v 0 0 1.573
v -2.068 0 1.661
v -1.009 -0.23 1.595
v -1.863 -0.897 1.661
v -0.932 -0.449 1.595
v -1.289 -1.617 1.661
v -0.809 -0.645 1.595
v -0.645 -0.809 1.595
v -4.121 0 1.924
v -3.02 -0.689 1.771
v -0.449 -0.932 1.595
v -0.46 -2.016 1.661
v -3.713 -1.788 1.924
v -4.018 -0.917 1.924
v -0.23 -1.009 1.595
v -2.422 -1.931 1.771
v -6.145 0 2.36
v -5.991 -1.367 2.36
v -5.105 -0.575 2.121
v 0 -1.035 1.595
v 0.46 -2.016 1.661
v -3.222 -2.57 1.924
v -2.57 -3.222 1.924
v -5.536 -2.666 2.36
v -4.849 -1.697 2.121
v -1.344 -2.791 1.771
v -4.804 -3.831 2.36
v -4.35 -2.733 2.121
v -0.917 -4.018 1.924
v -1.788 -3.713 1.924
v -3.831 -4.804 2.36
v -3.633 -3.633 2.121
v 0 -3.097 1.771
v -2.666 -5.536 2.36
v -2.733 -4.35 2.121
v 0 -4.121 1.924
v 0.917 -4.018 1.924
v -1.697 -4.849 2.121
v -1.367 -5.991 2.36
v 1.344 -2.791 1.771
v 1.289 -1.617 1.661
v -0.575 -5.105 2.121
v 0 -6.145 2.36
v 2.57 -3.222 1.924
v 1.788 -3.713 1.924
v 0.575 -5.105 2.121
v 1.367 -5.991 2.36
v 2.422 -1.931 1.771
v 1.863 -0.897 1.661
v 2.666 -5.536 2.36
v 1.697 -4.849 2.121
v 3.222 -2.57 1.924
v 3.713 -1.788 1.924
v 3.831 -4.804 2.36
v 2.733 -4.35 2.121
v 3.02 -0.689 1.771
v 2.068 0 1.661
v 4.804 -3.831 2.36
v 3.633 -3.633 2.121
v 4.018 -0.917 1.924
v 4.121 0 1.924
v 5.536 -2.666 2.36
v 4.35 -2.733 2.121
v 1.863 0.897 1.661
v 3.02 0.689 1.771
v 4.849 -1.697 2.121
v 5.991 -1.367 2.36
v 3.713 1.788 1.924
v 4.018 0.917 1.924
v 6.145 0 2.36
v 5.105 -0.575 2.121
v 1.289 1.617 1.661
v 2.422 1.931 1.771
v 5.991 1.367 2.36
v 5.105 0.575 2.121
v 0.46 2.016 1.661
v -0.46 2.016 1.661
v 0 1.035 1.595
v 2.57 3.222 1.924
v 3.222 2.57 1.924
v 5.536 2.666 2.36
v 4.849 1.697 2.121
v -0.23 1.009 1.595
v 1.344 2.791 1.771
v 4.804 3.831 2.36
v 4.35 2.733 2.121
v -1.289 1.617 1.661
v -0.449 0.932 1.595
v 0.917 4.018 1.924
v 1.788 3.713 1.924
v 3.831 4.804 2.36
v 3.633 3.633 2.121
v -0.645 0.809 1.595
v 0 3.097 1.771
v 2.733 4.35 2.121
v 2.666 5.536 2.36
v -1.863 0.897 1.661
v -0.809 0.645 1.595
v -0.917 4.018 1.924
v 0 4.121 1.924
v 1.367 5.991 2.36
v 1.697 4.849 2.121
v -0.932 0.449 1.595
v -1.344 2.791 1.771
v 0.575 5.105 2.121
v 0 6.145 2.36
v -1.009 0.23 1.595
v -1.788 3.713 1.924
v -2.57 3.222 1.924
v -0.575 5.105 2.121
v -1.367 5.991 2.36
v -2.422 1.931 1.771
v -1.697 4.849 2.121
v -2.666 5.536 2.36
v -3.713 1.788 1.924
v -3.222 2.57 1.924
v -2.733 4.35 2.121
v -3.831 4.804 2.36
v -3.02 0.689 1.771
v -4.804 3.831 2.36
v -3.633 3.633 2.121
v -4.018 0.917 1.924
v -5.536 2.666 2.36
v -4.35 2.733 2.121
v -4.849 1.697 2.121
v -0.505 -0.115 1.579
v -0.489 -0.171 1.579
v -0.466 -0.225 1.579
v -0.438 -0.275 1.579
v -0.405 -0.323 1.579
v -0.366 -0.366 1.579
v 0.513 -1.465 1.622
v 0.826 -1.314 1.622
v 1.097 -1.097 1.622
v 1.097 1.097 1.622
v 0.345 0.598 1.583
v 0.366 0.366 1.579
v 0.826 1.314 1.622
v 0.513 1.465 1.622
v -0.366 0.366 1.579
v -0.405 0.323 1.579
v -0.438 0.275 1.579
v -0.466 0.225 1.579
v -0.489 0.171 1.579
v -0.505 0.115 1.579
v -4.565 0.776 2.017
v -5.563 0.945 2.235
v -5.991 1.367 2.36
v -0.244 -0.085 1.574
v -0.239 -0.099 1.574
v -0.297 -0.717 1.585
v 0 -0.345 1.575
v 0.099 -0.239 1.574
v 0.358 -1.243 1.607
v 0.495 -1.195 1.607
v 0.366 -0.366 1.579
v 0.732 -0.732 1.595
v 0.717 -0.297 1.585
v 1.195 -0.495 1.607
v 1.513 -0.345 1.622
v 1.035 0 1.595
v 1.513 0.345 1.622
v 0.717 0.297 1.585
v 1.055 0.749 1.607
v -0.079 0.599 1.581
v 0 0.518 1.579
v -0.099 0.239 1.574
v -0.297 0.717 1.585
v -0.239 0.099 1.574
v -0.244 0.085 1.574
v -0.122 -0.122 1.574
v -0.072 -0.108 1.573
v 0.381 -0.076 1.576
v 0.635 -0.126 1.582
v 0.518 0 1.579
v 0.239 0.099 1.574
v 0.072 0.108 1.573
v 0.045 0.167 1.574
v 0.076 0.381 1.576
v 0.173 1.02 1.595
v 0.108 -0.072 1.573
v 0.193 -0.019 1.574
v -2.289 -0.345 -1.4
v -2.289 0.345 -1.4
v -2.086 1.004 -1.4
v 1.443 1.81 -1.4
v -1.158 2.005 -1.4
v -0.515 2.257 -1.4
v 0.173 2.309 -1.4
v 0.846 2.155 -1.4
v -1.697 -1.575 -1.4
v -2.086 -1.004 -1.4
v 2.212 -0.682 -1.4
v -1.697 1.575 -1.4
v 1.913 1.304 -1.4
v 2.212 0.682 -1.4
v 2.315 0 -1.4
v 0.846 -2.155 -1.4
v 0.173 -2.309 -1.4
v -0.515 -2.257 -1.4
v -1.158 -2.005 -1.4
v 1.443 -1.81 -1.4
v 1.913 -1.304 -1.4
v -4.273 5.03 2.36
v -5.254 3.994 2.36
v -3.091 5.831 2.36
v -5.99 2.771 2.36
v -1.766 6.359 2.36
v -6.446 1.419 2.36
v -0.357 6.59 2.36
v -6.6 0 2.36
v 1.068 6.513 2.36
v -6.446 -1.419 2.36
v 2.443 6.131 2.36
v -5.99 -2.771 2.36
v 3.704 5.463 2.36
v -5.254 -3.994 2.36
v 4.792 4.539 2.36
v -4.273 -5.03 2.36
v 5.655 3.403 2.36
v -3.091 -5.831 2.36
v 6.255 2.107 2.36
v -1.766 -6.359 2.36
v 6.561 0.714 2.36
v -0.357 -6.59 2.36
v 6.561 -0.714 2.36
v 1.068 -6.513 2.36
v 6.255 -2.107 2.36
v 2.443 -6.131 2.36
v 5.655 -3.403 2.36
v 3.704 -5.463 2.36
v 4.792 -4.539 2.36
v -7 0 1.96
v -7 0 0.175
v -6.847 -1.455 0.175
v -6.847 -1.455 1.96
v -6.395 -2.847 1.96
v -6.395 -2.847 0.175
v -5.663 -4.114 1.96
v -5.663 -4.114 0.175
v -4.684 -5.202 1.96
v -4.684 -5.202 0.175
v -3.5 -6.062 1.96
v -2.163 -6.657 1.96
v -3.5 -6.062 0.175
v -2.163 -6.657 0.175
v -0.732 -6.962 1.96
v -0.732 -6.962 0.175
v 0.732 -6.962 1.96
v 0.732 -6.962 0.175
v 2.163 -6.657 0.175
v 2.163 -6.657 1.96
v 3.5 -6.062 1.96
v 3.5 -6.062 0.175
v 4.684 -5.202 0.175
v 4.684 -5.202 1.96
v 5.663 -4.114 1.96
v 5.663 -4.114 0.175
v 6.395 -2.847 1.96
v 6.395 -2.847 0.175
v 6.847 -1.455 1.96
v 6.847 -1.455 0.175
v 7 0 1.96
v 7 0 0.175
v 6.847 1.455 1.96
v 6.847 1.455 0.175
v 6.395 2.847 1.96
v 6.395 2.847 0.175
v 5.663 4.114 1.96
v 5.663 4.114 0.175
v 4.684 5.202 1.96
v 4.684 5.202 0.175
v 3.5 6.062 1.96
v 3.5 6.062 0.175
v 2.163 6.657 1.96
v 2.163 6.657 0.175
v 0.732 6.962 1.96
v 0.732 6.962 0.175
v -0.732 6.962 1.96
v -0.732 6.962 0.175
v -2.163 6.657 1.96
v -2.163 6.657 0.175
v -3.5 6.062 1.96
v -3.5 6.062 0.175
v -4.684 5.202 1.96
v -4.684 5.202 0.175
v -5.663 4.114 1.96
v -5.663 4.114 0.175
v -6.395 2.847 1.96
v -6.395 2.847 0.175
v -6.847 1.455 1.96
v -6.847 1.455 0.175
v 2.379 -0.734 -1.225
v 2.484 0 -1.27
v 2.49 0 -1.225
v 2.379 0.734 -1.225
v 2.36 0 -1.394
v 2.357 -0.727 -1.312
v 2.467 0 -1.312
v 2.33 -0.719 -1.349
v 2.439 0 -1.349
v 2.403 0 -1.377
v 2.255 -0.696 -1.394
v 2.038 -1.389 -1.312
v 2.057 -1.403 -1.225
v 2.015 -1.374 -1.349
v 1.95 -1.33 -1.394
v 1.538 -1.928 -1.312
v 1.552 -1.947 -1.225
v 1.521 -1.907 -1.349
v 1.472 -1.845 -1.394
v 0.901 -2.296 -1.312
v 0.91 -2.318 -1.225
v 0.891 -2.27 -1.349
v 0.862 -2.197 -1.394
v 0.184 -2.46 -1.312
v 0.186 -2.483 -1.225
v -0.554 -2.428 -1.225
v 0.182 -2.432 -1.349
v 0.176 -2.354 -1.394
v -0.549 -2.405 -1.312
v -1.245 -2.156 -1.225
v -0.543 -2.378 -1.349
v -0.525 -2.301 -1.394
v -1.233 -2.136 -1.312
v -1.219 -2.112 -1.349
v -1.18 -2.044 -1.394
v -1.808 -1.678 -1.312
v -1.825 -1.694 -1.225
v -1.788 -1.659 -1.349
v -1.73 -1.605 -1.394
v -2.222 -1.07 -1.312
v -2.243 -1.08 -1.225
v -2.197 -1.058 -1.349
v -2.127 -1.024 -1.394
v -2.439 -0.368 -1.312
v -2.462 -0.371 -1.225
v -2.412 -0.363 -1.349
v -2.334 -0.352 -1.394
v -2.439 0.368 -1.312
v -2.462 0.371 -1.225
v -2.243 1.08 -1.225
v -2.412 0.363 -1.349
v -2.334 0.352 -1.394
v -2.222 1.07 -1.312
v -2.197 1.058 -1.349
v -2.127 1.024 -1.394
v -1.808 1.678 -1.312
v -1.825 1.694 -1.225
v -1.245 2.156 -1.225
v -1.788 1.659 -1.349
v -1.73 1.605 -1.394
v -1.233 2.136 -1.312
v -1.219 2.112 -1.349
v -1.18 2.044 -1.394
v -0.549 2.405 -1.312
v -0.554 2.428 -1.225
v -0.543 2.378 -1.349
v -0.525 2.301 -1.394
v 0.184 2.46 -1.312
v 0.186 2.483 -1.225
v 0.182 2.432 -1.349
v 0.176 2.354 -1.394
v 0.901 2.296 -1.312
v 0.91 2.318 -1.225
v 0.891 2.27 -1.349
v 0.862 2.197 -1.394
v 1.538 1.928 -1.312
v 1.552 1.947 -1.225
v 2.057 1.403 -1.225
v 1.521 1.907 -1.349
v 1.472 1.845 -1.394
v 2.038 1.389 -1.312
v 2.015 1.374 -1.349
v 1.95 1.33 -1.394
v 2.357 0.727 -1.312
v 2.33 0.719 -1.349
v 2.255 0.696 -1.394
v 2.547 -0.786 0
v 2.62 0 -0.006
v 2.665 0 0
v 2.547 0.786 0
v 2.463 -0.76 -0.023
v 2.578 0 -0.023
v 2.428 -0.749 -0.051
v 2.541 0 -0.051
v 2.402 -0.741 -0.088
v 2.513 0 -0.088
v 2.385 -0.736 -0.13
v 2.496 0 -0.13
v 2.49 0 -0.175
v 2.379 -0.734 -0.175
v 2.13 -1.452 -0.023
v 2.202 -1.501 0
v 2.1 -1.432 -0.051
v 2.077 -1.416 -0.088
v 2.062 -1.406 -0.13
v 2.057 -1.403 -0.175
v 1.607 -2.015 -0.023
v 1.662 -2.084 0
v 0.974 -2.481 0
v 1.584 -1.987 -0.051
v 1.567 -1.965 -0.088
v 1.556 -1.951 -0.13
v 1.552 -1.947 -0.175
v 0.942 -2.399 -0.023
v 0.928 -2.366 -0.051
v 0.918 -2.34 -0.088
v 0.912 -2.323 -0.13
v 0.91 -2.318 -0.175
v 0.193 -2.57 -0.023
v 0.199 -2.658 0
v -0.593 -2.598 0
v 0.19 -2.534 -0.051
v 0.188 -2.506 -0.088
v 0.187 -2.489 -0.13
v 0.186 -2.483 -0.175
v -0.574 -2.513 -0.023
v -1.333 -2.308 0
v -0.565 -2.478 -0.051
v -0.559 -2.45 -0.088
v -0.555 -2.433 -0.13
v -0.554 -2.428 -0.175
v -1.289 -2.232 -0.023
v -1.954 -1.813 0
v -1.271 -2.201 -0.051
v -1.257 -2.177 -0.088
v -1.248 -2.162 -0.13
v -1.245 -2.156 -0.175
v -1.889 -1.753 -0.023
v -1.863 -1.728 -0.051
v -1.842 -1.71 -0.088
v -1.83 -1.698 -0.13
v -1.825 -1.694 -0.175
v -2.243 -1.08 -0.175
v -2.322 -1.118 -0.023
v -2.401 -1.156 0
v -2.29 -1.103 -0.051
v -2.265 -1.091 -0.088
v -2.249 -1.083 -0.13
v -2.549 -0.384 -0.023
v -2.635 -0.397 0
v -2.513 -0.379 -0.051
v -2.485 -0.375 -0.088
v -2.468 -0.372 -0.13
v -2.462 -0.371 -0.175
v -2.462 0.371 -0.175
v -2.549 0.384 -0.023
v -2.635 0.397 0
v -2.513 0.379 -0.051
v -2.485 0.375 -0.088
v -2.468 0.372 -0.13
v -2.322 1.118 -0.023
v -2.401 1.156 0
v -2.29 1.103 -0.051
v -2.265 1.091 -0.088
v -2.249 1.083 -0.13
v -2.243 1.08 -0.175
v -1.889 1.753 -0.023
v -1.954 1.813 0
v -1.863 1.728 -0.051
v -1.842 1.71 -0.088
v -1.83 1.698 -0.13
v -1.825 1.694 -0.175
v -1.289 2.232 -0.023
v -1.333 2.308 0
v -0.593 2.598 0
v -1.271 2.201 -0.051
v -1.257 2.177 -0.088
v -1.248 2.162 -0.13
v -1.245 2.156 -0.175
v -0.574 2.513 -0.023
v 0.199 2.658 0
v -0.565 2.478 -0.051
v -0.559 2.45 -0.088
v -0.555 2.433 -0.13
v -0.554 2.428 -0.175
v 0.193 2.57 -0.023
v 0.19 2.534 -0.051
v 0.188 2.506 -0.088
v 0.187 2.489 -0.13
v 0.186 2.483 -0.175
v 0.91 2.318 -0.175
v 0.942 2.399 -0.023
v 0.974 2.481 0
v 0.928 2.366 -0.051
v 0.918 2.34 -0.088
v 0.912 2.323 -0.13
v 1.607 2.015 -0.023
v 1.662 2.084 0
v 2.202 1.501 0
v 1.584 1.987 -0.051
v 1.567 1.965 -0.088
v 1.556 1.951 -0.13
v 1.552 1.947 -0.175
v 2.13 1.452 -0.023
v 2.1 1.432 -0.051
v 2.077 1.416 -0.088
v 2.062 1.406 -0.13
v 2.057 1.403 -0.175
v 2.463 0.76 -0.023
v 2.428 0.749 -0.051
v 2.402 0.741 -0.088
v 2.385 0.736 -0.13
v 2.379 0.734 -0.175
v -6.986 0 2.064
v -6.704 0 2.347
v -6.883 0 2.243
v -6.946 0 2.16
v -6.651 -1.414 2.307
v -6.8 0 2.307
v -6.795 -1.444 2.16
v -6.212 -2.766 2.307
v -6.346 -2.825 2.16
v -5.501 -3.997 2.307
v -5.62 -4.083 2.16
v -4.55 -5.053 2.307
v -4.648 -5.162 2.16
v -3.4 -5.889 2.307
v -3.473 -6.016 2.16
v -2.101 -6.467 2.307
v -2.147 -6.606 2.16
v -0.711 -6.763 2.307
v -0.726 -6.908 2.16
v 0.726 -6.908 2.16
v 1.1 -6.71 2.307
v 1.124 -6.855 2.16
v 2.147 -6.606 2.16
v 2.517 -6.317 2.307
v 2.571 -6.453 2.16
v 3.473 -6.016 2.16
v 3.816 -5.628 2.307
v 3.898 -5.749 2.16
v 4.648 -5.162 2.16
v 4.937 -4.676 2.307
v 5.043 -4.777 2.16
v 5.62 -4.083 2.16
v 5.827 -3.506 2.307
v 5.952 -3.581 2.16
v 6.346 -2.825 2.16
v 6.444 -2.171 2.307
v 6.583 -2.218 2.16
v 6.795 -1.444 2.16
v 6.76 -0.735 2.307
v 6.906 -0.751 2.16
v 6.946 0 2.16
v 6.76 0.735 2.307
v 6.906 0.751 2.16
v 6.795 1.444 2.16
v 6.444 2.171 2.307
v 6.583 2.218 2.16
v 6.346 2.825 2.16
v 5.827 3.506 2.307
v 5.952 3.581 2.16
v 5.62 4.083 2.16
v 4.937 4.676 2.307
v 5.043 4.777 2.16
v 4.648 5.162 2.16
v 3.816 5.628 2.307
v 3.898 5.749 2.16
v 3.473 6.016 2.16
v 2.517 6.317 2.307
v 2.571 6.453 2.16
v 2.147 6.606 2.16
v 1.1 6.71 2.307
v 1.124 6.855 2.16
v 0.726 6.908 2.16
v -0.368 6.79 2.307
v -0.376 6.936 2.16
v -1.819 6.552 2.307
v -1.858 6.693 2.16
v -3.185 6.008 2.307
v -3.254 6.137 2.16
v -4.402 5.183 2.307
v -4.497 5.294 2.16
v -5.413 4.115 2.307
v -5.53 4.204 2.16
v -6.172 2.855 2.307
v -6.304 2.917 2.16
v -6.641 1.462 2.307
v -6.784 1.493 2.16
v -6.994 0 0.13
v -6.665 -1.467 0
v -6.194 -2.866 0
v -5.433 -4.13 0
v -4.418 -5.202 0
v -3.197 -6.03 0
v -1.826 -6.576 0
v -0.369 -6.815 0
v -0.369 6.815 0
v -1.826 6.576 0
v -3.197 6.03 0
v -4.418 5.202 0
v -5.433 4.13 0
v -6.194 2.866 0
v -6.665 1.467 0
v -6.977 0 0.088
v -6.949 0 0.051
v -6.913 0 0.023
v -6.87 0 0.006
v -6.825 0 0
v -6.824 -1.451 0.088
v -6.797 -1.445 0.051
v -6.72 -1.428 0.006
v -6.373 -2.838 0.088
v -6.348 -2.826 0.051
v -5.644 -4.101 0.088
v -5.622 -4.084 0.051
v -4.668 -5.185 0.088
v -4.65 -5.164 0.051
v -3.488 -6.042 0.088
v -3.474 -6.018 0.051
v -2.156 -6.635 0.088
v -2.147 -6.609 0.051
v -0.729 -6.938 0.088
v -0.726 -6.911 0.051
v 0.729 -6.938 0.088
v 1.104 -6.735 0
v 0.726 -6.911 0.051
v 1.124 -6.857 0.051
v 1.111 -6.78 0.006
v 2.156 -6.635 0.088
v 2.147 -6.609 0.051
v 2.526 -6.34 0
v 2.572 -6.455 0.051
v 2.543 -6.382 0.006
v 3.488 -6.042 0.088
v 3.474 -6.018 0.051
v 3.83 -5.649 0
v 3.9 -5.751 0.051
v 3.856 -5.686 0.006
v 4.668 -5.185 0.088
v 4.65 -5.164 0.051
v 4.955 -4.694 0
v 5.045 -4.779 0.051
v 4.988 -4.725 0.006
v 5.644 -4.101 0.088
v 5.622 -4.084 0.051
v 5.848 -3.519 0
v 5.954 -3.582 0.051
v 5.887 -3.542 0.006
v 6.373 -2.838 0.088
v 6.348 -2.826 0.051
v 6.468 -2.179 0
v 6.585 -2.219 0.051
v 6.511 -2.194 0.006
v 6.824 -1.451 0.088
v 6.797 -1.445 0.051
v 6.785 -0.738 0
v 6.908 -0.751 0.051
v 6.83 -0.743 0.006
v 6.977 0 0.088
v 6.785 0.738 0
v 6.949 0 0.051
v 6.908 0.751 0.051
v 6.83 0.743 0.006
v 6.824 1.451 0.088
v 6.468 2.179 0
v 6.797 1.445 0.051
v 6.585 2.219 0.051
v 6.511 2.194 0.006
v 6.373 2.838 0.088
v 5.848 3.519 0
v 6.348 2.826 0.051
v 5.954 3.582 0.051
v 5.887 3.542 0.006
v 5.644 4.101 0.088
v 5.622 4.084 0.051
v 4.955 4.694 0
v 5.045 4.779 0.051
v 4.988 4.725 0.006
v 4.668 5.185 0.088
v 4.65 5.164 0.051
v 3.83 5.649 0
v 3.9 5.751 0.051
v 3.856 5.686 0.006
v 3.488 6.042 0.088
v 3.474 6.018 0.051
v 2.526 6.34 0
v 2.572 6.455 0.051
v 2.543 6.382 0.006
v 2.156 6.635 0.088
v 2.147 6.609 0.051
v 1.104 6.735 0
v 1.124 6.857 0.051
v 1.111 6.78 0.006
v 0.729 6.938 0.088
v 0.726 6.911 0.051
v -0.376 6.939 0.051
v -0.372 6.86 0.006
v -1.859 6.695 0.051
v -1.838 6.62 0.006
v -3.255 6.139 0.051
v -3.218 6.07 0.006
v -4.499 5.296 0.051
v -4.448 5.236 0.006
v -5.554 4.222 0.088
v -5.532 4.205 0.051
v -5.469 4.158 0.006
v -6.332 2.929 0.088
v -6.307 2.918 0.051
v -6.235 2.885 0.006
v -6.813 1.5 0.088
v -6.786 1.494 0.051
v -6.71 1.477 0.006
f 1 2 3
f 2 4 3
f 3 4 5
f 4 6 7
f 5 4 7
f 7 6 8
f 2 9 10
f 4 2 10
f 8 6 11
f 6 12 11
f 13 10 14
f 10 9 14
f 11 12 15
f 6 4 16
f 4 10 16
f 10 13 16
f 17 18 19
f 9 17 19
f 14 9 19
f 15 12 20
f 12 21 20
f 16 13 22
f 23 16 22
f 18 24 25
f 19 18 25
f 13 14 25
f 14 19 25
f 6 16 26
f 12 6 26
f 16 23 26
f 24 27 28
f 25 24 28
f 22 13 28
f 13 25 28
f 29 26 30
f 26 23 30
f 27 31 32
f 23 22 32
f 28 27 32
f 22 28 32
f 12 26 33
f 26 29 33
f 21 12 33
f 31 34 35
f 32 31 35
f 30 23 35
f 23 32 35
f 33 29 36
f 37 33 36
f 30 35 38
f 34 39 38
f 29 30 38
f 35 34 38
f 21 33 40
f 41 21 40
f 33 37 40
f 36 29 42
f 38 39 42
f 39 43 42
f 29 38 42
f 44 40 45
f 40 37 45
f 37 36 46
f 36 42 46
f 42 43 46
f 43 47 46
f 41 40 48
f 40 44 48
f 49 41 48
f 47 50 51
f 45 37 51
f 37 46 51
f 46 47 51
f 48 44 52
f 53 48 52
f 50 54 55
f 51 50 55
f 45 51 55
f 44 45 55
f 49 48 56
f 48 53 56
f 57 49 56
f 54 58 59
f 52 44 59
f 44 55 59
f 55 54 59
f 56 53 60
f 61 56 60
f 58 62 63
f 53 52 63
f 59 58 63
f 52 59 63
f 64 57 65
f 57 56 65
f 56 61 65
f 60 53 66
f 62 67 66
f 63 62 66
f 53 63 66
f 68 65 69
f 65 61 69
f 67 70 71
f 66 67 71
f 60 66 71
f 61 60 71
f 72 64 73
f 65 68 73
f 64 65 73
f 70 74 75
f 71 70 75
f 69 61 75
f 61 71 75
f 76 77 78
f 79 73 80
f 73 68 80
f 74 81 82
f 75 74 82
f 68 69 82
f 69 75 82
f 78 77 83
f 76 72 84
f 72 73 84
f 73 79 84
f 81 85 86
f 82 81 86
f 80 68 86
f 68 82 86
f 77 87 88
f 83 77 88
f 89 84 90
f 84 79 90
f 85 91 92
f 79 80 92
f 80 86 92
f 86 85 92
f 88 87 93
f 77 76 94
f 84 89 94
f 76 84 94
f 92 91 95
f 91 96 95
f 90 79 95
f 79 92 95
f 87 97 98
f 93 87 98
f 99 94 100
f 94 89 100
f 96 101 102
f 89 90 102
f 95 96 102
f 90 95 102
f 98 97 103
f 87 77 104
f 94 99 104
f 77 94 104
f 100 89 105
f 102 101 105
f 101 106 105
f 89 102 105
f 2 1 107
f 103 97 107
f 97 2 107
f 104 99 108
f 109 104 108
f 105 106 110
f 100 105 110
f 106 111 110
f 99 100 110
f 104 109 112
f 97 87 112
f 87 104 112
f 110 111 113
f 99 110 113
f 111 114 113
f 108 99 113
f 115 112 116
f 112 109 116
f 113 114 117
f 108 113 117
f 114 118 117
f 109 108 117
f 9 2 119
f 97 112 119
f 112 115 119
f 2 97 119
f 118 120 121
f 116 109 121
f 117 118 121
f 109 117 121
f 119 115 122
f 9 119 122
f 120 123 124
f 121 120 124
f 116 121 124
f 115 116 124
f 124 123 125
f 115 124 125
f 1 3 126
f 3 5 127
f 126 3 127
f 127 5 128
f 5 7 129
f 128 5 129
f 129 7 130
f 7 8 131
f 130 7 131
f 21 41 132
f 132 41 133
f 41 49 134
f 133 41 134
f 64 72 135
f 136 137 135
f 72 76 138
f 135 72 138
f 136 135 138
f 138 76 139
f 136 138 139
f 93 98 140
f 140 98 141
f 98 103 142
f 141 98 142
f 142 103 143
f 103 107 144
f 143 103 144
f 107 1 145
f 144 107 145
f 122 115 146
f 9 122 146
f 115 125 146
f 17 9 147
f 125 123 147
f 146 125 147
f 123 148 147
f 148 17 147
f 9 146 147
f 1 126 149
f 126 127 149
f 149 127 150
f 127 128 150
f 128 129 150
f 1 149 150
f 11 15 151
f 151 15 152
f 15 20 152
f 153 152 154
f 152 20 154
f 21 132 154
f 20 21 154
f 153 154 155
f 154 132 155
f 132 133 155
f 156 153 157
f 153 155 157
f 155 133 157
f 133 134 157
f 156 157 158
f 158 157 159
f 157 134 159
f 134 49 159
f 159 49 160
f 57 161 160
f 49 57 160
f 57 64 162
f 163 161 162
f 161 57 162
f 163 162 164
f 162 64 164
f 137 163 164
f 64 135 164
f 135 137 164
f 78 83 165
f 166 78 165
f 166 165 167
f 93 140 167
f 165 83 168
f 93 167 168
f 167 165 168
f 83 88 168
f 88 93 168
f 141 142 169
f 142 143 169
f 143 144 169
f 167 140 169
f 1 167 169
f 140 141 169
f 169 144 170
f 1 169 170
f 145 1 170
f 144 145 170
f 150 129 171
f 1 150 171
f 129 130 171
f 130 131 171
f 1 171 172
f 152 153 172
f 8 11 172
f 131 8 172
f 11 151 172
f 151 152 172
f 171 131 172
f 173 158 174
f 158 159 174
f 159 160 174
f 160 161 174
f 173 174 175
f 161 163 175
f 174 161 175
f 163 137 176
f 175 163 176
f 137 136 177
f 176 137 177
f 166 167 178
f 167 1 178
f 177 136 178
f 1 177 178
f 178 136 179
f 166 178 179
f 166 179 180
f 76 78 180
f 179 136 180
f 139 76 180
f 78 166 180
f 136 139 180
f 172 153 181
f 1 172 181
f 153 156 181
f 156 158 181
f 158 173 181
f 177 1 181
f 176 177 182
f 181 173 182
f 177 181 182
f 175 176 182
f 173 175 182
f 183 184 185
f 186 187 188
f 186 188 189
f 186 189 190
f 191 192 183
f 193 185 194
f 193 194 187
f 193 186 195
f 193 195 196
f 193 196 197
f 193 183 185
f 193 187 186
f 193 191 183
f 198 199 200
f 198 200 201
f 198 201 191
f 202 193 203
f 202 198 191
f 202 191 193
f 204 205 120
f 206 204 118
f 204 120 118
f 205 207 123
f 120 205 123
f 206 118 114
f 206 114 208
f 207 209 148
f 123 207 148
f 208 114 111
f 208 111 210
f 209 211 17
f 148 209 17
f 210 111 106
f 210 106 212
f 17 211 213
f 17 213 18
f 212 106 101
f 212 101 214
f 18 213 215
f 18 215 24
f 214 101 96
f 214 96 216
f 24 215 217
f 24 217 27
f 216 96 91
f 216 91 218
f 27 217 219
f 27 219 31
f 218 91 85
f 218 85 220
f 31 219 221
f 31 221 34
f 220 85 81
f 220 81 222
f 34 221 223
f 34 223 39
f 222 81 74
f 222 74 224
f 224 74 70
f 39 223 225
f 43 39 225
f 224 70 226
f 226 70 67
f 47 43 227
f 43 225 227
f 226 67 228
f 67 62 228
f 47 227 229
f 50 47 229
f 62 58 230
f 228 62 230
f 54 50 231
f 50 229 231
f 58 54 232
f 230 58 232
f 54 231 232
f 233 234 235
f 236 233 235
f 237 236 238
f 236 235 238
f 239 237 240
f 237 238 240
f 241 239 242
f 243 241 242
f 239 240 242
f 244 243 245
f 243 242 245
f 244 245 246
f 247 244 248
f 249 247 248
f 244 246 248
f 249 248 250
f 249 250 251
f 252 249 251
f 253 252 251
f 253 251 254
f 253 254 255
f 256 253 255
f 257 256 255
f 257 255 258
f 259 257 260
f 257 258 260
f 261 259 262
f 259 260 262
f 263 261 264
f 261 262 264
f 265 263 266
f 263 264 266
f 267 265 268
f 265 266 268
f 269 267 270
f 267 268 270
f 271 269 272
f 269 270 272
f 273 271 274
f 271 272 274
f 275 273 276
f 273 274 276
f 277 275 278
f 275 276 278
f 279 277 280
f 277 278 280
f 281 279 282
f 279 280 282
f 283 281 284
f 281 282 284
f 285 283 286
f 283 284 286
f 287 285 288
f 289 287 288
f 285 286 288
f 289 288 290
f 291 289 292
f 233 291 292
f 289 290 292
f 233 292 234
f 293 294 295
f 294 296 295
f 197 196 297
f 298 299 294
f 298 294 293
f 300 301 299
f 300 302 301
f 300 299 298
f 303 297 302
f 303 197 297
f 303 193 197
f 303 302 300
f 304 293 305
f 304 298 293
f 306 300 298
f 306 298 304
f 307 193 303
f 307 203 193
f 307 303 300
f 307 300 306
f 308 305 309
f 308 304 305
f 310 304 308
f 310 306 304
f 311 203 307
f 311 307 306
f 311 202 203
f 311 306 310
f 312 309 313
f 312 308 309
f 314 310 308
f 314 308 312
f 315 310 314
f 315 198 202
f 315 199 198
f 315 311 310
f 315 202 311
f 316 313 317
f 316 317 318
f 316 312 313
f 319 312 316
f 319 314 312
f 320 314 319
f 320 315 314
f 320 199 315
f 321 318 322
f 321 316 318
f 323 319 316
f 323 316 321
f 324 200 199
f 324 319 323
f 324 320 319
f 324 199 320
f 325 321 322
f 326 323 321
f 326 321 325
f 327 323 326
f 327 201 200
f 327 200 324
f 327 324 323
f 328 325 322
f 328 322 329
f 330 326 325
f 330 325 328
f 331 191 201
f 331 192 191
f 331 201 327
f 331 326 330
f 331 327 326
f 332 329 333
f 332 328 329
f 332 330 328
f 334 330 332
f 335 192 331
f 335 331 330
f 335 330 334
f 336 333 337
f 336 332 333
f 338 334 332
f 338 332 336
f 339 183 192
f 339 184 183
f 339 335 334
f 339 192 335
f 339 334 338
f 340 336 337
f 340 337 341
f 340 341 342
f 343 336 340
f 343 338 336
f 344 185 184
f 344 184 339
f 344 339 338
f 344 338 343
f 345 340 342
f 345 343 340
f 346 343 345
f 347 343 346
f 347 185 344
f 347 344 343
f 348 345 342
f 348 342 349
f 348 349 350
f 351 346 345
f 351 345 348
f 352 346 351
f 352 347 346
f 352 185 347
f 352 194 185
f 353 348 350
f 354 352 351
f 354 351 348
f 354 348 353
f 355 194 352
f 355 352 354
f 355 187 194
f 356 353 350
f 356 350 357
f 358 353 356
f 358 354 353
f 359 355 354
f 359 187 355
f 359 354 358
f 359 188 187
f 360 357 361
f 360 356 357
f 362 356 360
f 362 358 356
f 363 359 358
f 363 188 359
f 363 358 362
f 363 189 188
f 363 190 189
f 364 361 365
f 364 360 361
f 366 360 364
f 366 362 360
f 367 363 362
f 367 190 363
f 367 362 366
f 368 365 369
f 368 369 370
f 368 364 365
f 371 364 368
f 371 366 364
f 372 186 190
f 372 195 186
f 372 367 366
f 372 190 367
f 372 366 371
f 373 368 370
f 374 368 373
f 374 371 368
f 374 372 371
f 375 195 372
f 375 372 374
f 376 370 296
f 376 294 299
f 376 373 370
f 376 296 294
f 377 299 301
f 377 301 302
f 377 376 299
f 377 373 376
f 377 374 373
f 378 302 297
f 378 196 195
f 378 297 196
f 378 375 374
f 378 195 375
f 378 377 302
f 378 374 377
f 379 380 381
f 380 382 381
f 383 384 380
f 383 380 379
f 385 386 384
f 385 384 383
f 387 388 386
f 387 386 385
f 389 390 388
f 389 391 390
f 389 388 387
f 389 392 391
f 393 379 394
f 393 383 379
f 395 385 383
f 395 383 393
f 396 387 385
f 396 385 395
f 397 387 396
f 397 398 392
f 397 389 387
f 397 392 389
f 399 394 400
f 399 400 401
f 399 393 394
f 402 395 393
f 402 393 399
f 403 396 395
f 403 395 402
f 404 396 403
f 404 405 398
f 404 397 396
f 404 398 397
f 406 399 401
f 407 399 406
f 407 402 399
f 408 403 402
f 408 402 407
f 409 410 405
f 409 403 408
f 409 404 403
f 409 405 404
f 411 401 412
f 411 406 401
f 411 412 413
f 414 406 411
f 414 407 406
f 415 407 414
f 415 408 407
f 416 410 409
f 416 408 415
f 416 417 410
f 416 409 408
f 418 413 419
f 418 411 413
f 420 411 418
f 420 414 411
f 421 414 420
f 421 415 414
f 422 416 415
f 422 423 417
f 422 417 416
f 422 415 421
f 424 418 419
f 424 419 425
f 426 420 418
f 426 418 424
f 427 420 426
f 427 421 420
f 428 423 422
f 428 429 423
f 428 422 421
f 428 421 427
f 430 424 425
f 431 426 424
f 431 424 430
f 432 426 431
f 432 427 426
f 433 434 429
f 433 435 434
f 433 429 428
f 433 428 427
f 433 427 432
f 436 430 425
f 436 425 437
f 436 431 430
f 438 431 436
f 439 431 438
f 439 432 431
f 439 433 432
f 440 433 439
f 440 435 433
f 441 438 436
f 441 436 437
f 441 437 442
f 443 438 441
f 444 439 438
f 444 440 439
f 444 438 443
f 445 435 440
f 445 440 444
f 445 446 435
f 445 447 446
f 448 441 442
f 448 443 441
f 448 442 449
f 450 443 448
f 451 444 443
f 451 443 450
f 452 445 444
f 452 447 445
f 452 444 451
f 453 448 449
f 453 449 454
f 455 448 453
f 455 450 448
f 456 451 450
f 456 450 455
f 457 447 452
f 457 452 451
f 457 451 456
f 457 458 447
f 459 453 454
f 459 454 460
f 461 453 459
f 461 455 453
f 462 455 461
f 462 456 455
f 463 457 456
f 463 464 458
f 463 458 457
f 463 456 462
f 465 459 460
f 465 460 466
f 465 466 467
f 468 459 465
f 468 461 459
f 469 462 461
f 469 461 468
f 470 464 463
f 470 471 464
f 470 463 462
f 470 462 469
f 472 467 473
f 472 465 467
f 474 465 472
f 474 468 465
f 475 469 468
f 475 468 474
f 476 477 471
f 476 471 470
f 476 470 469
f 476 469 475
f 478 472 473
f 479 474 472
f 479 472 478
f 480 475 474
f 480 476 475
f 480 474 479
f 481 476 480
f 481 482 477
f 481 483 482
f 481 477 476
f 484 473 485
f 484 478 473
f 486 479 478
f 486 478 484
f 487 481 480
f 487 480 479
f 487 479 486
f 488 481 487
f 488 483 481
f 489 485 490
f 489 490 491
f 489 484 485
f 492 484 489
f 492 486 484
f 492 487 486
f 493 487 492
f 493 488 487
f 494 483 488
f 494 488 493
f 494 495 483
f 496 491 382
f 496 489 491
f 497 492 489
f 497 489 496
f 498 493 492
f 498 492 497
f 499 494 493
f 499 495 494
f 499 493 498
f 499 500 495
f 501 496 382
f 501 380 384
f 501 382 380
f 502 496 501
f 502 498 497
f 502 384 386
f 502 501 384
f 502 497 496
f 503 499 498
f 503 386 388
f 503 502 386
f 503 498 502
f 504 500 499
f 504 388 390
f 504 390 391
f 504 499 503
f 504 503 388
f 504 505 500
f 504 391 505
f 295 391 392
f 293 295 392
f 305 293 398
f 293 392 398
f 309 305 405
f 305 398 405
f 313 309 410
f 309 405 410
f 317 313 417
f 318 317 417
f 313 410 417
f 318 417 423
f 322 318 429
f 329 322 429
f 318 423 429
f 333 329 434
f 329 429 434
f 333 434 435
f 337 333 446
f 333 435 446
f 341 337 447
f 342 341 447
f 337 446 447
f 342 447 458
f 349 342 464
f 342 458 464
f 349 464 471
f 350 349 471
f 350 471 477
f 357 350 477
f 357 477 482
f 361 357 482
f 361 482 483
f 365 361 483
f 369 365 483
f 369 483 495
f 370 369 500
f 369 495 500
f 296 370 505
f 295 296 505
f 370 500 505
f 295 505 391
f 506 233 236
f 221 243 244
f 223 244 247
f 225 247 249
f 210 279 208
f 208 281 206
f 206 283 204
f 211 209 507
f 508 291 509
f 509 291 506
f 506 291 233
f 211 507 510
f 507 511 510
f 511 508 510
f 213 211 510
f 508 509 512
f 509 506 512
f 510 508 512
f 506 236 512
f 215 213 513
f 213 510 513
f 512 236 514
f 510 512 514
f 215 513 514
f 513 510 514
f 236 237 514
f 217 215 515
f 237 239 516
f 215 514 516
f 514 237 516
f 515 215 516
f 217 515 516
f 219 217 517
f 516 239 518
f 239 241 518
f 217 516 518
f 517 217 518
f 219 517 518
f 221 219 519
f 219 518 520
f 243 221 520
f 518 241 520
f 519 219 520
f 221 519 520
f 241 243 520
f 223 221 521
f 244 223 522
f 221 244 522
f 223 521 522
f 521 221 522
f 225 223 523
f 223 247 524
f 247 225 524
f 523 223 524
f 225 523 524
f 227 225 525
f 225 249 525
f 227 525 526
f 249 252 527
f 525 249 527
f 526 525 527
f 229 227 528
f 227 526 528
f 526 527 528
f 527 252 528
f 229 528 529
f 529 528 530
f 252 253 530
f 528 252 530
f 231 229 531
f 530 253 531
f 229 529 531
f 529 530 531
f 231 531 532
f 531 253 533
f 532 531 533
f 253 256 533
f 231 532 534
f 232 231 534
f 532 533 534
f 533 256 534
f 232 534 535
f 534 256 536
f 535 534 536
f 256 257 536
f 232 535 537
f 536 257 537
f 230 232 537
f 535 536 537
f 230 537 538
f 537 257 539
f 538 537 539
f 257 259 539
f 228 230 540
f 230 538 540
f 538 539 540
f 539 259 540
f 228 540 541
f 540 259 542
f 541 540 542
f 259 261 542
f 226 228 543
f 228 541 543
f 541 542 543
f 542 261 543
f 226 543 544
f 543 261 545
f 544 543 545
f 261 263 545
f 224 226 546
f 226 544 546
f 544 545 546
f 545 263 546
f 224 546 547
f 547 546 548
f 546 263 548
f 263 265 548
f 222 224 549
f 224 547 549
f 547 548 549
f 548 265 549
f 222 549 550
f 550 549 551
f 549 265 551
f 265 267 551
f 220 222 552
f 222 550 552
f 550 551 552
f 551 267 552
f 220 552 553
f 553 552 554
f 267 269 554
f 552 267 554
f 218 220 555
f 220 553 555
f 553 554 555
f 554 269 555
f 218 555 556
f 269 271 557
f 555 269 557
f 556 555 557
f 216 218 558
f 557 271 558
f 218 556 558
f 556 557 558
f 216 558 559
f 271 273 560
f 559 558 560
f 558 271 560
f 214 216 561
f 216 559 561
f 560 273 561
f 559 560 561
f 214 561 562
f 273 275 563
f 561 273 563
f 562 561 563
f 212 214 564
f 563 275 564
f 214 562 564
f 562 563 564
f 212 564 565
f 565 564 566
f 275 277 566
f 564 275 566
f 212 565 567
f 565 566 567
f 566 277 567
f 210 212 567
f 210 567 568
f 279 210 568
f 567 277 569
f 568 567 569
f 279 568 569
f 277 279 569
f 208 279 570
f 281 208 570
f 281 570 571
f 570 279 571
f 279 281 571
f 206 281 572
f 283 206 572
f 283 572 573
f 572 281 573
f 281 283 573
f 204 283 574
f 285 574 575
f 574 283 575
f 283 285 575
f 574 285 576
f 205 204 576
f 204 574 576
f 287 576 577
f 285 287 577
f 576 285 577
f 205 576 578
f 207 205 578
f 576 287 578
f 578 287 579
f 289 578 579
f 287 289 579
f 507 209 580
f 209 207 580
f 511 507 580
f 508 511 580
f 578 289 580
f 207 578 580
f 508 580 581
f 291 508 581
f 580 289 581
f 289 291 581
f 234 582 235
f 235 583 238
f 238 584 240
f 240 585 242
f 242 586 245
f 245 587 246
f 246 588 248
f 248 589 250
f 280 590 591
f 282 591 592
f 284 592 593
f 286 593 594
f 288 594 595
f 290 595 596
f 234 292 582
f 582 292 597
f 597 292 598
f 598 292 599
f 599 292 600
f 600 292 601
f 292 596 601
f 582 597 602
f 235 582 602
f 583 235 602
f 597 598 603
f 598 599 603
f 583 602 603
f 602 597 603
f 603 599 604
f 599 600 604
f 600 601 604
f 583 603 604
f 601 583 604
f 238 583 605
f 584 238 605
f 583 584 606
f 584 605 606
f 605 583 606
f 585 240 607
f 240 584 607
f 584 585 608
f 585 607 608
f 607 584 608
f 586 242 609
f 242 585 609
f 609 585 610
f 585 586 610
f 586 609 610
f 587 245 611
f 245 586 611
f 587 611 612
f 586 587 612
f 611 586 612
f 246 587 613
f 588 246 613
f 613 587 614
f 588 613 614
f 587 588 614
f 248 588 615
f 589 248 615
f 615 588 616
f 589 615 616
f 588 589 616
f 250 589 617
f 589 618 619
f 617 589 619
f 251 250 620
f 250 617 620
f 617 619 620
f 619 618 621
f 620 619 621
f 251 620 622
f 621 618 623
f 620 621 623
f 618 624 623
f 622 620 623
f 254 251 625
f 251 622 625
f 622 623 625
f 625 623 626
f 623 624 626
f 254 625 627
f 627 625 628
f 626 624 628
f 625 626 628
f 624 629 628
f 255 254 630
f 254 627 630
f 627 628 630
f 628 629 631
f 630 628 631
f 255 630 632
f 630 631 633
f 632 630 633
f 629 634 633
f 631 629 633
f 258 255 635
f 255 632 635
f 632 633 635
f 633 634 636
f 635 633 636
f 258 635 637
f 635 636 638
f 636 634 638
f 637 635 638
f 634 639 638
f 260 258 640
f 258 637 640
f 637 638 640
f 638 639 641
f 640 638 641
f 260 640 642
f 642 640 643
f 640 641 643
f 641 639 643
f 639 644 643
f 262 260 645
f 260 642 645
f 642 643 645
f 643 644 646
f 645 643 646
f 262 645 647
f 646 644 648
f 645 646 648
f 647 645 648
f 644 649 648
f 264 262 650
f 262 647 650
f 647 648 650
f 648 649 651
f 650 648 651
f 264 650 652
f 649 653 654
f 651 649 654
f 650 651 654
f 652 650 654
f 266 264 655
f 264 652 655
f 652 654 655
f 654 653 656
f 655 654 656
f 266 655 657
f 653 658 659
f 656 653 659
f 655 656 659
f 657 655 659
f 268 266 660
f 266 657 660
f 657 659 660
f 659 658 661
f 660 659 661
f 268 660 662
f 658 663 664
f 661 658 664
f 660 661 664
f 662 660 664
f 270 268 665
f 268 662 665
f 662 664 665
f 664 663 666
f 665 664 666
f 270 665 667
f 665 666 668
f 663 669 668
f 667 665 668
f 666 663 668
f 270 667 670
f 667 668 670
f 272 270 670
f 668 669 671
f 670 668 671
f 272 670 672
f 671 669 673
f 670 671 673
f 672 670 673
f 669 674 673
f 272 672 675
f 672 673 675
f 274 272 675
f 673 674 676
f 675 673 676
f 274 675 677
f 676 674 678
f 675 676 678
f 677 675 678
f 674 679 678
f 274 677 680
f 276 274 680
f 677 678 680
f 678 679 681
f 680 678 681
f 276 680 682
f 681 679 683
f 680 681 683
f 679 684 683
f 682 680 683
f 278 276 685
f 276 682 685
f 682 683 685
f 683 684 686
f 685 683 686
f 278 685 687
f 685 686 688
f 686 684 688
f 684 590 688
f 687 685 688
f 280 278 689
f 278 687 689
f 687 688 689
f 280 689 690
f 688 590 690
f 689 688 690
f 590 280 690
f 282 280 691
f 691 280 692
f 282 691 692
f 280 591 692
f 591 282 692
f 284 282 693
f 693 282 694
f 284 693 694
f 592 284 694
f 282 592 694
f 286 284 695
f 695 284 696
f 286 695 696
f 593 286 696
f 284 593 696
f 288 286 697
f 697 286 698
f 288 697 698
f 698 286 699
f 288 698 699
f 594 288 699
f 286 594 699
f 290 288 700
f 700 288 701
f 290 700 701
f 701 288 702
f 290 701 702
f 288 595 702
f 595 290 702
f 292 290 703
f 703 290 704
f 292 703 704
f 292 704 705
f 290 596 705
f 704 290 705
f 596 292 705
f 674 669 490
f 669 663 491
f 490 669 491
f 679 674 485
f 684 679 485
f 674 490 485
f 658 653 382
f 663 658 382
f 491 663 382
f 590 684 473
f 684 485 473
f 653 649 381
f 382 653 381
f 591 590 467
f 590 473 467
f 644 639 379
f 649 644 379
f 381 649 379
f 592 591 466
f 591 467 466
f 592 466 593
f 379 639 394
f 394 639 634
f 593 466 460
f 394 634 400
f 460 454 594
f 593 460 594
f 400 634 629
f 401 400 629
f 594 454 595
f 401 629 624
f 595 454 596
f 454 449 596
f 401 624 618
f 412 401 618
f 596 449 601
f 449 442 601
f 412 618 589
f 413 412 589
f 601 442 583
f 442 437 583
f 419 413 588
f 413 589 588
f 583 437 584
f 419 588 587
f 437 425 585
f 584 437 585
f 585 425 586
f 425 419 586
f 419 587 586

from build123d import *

# Parameters (mm, degrees)
F2_R     = 0.4
F3_R     = 2.49
F4_DEPTH = 1.4
F5_R     = 0.175


with BuildPart() as f1:
    # F0 (on Front) → F1 (revolve)
    with BuildSketch(Plane.XZ):
        with BuildLine():
            Line((-7, 0), (0, 0))
            Line((0, 0), (0, 1.573037))
            ThreePointArc((0, 1.573037), (-3.097478, 1.770684), (-6.144713, 2.360421))
            Line((-6.144713, 2.360421), (-7, 2.360421))
            Line((-7, 2.360421), (-7, 0))
        make_face()
    revolve(axis=Axis((0, 0, 0.786518), (0, 0, 1)))

    # F2
    f2_edges = [f1.edges().sort_by_distance(p)[0] for p in [
        (7, 0, 2.360421),
    ]]
    fillet(f2_edges, radius=F2_R)

    # F3 (on face) → F4 (join)
    with BuildSketch(Plane(origin=(0, 0, 0), x_dir=(1, 0, 0), z_dir=(0, 0, -1))):
        Circle(F3_R)
    extrude(amount=F4_DEPTH)

    # F5
    f5_edges = [f1.edges().sort_by_distance(p)[0] for p in [
        (-2.49, 0, -1.4),
        (-2.49, 0, 0),
        (7, 0, 0),
    ]]
    fillet(f5_edges, radius=F5_R)


solid = f1.part
